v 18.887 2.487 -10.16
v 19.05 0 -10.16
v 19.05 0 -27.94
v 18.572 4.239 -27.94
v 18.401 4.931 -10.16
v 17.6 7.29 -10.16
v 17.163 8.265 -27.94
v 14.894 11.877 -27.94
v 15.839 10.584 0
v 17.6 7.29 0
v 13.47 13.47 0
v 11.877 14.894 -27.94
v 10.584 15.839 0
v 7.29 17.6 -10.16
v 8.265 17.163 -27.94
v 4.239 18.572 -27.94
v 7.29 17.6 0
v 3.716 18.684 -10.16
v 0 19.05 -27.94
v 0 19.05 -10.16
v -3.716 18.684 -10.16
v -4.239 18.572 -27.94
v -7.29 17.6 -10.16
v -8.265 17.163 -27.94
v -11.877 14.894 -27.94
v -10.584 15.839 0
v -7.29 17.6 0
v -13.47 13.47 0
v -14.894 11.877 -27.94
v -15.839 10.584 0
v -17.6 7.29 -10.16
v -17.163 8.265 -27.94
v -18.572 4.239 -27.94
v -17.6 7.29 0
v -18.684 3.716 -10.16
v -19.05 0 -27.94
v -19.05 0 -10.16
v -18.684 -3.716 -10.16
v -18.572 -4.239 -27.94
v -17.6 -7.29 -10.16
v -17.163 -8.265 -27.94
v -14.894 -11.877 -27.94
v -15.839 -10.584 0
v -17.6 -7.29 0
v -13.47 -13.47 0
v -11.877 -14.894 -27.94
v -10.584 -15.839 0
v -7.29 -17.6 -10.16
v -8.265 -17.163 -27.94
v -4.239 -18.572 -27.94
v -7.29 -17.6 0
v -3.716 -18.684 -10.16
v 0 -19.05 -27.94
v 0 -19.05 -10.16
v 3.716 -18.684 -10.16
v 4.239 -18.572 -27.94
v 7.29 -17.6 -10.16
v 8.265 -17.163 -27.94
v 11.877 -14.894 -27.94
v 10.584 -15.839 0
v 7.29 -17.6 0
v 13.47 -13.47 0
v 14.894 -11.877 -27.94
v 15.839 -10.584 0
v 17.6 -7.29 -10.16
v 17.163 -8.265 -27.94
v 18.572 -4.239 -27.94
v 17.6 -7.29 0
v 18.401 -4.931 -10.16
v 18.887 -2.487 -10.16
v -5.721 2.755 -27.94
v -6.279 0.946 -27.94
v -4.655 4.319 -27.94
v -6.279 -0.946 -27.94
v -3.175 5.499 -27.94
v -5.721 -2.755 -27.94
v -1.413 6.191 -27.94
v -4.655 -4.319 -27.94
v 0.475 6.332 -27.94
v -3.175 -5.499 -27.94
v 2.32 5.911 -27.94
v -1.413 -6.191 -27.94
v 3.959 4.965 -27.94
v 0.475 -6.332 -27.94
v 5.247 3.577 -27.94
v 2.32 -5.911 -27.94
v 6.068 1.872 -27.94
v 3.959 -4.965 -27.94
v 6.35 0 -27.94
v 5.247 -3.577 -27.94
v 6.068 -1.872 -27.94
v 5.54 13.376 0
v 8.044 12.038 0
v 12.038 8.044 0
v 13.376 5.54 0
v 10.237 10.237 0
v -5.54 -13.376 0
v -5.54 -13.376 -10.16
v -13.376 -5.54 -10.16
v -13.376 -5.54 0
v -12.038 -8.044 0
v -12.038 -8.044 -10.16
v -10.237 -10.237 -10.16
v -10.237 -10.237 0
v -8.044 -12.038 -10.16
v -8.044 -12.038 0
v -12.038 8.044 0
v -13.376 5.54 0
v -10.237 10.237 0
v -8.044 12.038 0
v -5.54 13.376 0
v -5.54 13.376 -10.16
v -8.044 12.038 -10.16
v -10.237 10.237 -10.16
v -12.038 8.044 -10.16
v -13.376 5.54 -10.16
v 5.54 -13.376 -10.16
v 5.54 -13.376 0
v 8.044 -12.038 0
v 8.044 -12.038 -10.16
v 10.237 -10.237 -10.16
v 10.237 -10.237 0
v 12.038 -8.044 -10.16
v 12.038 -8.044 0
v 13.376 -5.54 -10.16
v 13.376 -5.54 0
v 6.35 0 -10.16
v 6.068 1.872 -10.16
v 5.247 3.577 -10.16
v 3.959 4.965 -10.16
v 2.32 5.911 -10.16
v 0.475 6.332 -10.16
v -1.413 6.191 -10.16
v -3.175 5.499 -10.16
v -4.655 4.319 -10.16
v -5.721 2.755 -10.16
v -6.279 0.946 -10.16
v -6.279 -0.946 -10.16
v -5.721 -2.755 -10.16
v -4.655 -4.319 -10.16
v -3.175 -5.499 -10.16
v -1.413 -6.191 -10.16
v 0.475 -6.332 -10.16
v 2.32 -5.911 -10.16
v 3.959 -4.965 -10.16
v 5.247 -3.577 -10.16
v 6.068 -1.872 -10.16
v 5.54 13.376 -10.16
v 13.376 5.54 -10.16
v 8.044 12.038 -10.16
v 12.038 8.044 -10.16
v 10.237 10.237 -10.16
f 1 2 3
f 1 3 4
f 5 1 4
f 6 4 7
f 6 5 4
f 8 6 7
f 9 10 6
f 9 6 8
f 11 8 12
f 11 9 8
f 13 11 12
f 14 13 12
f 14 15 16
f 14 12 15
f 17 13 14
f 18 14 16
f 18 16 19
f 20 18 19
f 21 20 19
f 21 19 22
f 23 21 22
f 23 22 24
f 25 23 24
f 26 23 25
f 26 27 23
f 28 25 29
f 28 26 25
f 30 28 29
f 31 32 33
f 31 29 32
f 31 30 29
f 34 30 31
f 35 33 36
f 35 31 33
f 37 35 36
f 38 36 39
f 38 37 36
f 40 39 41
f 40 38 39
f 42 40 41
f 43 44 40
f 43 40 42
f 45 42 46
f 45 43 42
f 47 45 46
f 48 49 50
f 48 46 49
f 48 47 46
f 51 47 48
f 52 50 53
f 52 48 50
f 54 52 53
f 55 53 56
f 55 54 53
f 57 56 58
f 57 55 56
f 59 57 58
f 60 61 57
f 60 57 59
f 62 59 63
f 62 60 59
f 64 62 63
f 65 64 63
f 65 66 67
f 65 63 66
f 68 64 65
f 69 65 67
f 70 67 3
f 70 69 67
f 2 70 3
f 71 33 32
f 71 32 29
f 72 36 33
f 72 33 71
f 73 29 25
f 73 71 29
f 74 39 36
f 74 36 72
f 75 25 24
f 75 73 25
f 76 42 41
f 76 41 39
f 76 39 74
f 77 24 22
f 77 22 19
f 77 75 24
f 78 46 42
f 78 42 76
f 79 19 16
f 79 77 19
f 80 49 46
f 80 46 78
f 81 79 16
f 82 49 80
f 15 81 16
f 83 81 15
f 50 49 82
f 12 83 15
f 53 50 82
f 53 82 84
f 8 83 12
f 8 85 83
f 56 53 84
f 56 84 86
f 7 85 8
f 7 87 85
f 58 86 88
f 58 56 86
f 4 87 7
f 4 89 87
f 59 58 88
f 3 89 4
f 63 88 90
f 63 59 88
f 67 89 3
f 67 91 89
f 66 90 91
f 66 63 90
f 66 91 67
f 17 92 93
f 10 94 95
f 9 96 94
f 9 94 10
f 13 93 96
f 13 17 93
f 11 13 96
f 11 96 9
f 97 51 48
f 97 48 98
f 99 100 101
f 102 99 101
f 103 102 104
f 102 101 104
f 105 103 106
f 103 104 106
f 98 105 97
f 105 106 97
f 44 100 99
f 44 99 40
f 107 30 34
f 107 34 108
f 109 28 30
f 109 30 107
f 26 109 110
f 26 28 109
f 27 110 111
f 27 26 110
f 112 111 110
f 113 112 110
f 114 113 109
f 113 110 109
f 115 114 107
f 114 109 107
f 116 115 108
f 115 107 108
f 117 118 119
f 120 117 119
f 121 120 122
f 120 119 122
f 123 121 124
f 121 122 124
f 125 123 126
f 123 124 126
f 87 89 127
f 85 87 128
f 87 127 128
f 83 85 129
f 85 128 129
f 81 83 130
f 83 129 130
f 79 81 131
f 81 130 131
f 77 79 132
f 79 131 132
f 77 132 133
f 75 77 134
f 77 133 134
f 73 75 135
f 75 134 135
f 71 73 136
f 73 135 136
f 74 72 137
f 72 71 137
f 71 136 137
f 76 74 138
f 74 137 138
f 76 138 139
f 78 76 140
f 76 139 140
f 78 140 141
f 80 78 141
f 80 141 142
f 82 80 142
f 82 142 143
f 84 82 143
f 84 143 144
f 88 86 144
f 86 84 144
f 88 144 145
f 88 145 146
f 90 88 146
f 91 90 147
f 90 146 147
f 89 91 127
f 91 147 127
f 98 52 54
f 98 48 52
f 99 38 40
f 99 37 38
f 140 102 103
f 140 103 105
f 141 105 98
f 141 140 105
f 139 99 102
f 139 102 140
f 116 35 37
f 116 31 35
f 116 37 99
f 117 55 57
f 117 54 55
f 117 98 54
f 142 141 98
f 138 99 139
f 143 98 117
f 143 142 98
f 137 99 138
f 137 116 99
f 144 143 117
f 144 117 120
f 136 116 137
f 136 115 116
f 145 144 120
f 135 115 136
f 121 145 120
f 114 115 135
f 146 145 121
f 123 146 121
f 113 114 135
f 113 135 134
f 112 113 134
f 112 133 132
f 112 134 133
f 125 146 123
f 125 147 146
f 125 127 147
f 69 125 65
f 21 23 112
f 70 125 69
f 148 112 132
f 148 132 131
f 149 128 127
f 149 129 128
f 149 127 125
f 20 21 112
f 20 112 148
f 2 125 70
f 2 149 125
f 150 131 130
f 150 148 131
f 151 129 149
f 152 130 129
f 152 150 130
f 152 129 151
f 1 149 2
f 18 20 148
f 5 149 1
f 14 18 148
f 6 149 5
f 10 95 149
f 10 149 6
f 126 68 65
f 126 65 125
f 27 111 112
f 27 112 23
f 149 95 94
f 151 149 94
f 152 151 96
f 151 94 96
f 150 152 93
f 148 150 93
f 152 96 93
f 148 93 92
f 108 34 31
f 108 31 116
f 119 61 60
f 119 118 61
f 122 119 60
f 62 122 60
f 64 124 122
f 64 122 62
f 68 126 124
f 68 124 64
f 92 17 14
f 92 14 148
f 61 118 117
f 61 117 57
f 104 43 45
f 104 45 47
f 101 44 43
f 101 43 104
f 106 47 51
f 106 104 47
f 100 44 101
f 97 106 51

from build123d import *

# Parameters (mm, degrees)
SKETCH1_R           = 19.05
SKETCH1_R_2         = 14.478
BOSS_EXTRUDE1_DEPTH = 38.1
BOSS_EXTRUDE2_START = -10.16
SKETCH2_R           = 14.478
SKETCH2_R_2         = 6.35
BOSS_EXTRUDE2_DEPTH = 27.94
CUT_EXTRUDE1_DEPTH  = 10.16
CUT_EXTRUDE2_START  = -10.16
SKETCH4_R           = 19.05
SKETCH4_R_2         = 6.35
CUT_EXTRUDE2_DEPTH  = 10.16


with BuildPart() as part:
    # Sketch1 → Boss-Extrude1 (new body)
    with BuildSketch(Plane.XY):
        Circle(SKETCH1_R)
        Circle(SKETCH1_R_2, mode=Mode.SUBTRACT)
    extrude(amount=-BOSS_EXTRUDE1_DEPTH)

    # Sketch2 → Boss-Extrude2 (add)
    with BuildSketch(Plane.XY.offset(BOSS_EXTRUDE2_START)):
        Circle(SKETCH2_R)
        Circle(SKETCH2_R_2, mode=Mode.SUBTRACT)
    extrude(amount=-BOSS_EXTRUDE2_DEPTH)

    # Sketch3 → Cut-Extrude1 (cut)
    with BuildSketch(Plane.XY):
        with BuildLine():
            Line((-5.540490734, 13.375927872), (-7.290119387, 17.599905094))
            ThreePointArc((-7.290119387, 17.599905094), (0, 19.05), (7.290119387, 17.599905094))
            Line((7.290119387, 17.599905094), (5.540490734, 13.375927872))
            ThreePointArc((5.540490734, 13.375927872), (0, 14.478), (-5.540490734, 13.375927872))
        make_face()
        with BuildLine():
            Line((13.375927872, 5.540490734), (17.599905094, 7.290119387))
            ThreePointArc((17.599905094, 7.290119387), (19.05, 0), (17.599905094, -7.290119387))
            Line((17.599905094, -7.290119387), (13.375927872, -5.540490734))
            ThreePointArc((13.375927872, -5.540490734), (14.478, 0), (13.375927872, 5.540490734))
        make_face()
        with BuildLine():
            Line((5.540490734, -13.375927872), (7.290119387, -17.599905094))
            ThreePointArc((7.290119387, -17.599905094), (0, -19.05), (-7.290119387, -17.599905094))
            Line((-7.290119387, -17.599905094), (-5.540490734, -13.375927872))
            ThreePointArc((-5.540490734, -13.375927872), (0, -14.478), (5.540490734, -13.375927872))
        make_face()
        with BuildLine():
            Line((-13.375927872, -5.540490734), (-17.599905094, -7.290119387))
            ThreePointArc((-17.599905094, -7.290119387), (-19.05, 0), (-17.599905094, 7.290119387))
            Line((-17.599905094, 7.290119387), (-13.375927872, 5.540490734))
            ThreePointArc((-13.375927872, 5.540490734), (-14.478, 0), (-13.375927872, -5.540490734))
        make_face()
    extrude(amount=-CUT_EXTRUDE1_DEPTH, mode=Mode.SUBTRACT)

    # Sketch4 → Cut-Extrude2 (cut)
    with BuildSketch(Plane(origin=(0, 0, -38.1), x_dir=(-1, 0, 0), z_dir=(0, 0, -1)).offset(CUT_EXTRUDE2_START)):
        with Locations(Location((0, 0, 0), (0, 0, 157.5))):
            Circle(SKETCH4_R)
        with Locations(Location((0, 0, 0), (0, 0, 180))):
            Circle(SKETCH4_R_2, mode=Mode.SUBTRACT)
    extrude(amount=CUT_EXTRUDE2_DEPTH, mode=Mode.SUBTRACT)


solid = part.part
